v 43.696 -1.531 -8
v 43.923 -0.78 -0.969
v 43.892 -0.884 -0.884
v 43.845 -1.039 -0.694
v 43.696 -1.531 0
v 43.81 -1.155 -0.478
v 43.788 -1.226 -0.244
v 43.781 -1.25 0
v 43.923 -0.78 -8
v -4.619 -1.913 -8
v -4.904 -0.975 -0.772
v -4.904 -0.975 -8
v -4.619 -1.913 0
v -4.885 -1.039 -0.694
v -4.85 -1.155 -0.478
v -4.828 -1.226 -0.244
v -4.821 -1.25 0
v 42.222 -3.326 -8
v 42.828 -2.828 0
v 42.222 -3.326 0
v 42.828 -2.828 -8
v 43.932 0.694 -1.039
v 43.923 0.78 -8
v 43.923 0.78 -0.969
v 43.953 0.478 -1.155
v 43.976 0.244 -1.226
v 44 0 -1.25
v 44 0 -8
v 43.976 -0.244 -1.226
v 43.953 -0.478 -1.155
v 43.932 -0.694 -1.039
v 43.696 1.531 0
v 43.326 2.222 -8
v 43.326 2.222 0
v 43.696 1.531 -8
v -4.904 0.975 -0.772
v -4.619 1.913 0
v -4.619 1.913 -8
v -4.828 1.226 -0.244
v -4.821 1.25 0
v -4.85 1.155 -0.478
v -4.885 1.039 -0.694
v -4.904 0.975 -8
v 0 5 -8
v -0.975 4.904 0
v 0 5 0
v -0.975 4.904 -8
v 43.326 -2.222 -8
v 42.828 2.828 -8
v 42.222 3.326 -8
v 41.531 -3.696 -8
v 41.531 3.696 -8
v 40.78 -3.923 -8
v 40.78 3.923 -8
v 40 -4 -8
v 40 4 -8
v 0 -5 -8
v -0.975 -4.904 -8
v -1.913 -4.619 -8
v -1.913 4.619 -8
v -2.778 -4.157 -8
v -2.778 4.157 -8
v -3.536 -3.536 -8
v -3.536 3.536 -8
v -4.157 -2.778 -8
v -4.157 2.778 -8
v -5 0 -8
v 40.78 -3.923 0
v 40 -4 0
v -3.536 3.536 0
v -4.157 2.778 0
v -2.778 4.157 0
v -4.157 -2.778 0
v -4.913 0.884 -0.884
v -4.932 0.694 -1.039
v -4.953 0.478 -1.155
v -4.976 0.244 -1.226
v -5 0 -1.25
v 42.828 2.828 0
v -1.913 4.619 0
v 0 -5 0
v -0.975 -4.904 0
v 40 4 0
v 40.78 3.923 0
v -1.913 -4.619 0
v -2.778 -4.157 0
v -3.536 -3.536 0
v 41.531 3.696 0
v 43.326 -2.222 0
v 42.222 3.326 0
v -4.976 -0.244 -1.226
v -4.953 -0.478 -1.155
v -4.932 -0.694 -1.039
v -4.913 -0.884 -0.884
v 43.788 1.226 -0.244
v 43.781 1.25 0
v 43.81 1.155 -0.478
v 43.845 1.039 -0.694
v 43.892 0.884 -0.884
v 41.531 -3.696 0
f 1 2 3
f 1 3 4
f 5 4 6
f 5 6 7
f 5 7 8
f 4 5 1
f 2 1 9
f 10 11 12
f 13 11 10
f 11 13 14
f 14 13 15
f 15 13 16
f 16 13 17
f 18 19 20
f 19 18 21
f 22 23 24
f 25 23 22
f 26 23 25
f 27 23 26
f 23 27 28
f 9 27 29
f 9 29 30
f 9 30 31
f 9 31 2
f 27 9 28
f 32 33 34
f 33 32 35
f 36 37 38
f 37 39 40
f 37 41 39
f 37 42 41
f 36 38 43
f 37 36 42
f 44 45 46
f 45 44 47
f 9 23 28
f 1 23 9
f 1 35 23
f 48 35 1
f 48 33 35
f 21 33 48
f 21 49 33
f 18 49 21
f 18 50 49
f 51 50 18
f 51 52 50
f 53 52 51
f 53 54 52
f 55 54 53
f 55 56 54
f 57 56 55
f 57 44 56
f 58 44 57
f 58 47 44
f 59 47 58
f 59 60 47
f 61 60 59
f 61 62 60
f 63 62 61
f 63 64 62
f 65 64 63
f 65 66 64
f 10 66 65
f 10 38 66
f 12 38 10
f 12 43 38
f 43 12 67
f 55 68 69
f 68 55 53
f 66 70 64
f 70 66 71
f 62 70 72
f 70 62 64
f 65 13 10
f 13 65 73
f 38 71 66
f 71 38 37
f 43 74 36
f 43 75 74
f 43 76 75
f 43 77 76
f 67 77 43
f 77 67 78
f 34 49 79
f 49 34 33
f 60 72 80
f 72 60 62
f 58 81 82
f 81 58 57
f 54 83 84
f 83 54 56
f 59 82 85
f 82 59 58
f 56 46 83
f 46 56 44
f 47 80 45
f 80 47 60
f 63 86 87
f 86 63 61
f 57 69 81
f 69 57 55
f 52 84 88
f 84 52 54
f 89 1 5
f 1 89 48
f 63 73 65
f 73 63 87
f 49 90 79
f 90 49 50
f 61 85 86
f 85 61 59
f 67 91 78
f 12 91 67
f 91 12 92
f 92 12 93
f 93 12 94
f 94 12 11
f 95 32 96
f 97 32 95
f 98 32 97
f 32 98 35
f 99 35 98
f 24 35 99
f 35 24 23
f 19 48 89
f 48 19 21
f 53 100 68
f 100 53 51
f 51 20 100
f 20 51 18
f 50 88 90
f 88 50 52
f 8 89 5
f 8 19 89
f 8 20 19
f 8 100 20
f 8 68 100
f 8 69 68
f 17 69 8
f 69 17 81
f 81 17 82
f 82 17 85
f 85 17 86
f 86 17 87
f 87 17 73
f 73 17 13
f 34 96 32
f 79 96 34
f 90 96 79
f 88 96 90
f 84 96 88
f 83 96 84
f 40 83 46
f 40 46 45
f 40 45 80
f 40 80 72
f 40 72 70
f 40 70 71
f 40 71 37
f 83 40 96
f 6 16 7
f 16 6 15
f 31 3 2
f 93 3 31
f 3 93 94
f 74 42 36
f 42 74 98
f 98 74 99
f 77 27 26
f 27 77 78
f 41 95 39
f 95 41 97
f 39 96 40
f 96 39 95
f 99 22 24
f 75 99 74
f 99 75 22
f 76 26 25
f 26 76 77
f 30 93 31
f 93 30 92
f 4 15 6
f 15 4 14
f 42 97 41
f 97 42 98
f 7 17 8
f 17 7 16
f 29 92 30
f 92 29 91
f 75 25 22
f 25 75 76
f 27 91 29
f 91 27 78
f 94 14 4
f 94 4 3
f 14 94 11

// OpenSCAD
// COBRA Finger Segment - MIDDLE
// Length: 40.0mm, Width: 10mm

$fn = 32;

module finger_segment() {
    difference() {
        hull() {
            translate([0, 0, -4])
            cylinder(h=8, d=10, center=true);
            
            translate([40.0, 0, -4])
            cylinder(h=8, d=8.0, center=true);
        }
        
        // Tendon channel
        translate([20.0, 0, 0])
        rotate([0, 90, 0])
        cylinder(h=42.0, d=2.5, center=true);
        
        // Pivot holes
        translate([0, 0, 0])
        rotate([0, 90, 0])
        cylinder(h=12, d=2.5, center=true);
        
        translate([40.0, 0, 0])
        rotate([0, 90, 0])
        cylinder(h=12, d=2.5, center=true);
    }
}

finger_segment();
